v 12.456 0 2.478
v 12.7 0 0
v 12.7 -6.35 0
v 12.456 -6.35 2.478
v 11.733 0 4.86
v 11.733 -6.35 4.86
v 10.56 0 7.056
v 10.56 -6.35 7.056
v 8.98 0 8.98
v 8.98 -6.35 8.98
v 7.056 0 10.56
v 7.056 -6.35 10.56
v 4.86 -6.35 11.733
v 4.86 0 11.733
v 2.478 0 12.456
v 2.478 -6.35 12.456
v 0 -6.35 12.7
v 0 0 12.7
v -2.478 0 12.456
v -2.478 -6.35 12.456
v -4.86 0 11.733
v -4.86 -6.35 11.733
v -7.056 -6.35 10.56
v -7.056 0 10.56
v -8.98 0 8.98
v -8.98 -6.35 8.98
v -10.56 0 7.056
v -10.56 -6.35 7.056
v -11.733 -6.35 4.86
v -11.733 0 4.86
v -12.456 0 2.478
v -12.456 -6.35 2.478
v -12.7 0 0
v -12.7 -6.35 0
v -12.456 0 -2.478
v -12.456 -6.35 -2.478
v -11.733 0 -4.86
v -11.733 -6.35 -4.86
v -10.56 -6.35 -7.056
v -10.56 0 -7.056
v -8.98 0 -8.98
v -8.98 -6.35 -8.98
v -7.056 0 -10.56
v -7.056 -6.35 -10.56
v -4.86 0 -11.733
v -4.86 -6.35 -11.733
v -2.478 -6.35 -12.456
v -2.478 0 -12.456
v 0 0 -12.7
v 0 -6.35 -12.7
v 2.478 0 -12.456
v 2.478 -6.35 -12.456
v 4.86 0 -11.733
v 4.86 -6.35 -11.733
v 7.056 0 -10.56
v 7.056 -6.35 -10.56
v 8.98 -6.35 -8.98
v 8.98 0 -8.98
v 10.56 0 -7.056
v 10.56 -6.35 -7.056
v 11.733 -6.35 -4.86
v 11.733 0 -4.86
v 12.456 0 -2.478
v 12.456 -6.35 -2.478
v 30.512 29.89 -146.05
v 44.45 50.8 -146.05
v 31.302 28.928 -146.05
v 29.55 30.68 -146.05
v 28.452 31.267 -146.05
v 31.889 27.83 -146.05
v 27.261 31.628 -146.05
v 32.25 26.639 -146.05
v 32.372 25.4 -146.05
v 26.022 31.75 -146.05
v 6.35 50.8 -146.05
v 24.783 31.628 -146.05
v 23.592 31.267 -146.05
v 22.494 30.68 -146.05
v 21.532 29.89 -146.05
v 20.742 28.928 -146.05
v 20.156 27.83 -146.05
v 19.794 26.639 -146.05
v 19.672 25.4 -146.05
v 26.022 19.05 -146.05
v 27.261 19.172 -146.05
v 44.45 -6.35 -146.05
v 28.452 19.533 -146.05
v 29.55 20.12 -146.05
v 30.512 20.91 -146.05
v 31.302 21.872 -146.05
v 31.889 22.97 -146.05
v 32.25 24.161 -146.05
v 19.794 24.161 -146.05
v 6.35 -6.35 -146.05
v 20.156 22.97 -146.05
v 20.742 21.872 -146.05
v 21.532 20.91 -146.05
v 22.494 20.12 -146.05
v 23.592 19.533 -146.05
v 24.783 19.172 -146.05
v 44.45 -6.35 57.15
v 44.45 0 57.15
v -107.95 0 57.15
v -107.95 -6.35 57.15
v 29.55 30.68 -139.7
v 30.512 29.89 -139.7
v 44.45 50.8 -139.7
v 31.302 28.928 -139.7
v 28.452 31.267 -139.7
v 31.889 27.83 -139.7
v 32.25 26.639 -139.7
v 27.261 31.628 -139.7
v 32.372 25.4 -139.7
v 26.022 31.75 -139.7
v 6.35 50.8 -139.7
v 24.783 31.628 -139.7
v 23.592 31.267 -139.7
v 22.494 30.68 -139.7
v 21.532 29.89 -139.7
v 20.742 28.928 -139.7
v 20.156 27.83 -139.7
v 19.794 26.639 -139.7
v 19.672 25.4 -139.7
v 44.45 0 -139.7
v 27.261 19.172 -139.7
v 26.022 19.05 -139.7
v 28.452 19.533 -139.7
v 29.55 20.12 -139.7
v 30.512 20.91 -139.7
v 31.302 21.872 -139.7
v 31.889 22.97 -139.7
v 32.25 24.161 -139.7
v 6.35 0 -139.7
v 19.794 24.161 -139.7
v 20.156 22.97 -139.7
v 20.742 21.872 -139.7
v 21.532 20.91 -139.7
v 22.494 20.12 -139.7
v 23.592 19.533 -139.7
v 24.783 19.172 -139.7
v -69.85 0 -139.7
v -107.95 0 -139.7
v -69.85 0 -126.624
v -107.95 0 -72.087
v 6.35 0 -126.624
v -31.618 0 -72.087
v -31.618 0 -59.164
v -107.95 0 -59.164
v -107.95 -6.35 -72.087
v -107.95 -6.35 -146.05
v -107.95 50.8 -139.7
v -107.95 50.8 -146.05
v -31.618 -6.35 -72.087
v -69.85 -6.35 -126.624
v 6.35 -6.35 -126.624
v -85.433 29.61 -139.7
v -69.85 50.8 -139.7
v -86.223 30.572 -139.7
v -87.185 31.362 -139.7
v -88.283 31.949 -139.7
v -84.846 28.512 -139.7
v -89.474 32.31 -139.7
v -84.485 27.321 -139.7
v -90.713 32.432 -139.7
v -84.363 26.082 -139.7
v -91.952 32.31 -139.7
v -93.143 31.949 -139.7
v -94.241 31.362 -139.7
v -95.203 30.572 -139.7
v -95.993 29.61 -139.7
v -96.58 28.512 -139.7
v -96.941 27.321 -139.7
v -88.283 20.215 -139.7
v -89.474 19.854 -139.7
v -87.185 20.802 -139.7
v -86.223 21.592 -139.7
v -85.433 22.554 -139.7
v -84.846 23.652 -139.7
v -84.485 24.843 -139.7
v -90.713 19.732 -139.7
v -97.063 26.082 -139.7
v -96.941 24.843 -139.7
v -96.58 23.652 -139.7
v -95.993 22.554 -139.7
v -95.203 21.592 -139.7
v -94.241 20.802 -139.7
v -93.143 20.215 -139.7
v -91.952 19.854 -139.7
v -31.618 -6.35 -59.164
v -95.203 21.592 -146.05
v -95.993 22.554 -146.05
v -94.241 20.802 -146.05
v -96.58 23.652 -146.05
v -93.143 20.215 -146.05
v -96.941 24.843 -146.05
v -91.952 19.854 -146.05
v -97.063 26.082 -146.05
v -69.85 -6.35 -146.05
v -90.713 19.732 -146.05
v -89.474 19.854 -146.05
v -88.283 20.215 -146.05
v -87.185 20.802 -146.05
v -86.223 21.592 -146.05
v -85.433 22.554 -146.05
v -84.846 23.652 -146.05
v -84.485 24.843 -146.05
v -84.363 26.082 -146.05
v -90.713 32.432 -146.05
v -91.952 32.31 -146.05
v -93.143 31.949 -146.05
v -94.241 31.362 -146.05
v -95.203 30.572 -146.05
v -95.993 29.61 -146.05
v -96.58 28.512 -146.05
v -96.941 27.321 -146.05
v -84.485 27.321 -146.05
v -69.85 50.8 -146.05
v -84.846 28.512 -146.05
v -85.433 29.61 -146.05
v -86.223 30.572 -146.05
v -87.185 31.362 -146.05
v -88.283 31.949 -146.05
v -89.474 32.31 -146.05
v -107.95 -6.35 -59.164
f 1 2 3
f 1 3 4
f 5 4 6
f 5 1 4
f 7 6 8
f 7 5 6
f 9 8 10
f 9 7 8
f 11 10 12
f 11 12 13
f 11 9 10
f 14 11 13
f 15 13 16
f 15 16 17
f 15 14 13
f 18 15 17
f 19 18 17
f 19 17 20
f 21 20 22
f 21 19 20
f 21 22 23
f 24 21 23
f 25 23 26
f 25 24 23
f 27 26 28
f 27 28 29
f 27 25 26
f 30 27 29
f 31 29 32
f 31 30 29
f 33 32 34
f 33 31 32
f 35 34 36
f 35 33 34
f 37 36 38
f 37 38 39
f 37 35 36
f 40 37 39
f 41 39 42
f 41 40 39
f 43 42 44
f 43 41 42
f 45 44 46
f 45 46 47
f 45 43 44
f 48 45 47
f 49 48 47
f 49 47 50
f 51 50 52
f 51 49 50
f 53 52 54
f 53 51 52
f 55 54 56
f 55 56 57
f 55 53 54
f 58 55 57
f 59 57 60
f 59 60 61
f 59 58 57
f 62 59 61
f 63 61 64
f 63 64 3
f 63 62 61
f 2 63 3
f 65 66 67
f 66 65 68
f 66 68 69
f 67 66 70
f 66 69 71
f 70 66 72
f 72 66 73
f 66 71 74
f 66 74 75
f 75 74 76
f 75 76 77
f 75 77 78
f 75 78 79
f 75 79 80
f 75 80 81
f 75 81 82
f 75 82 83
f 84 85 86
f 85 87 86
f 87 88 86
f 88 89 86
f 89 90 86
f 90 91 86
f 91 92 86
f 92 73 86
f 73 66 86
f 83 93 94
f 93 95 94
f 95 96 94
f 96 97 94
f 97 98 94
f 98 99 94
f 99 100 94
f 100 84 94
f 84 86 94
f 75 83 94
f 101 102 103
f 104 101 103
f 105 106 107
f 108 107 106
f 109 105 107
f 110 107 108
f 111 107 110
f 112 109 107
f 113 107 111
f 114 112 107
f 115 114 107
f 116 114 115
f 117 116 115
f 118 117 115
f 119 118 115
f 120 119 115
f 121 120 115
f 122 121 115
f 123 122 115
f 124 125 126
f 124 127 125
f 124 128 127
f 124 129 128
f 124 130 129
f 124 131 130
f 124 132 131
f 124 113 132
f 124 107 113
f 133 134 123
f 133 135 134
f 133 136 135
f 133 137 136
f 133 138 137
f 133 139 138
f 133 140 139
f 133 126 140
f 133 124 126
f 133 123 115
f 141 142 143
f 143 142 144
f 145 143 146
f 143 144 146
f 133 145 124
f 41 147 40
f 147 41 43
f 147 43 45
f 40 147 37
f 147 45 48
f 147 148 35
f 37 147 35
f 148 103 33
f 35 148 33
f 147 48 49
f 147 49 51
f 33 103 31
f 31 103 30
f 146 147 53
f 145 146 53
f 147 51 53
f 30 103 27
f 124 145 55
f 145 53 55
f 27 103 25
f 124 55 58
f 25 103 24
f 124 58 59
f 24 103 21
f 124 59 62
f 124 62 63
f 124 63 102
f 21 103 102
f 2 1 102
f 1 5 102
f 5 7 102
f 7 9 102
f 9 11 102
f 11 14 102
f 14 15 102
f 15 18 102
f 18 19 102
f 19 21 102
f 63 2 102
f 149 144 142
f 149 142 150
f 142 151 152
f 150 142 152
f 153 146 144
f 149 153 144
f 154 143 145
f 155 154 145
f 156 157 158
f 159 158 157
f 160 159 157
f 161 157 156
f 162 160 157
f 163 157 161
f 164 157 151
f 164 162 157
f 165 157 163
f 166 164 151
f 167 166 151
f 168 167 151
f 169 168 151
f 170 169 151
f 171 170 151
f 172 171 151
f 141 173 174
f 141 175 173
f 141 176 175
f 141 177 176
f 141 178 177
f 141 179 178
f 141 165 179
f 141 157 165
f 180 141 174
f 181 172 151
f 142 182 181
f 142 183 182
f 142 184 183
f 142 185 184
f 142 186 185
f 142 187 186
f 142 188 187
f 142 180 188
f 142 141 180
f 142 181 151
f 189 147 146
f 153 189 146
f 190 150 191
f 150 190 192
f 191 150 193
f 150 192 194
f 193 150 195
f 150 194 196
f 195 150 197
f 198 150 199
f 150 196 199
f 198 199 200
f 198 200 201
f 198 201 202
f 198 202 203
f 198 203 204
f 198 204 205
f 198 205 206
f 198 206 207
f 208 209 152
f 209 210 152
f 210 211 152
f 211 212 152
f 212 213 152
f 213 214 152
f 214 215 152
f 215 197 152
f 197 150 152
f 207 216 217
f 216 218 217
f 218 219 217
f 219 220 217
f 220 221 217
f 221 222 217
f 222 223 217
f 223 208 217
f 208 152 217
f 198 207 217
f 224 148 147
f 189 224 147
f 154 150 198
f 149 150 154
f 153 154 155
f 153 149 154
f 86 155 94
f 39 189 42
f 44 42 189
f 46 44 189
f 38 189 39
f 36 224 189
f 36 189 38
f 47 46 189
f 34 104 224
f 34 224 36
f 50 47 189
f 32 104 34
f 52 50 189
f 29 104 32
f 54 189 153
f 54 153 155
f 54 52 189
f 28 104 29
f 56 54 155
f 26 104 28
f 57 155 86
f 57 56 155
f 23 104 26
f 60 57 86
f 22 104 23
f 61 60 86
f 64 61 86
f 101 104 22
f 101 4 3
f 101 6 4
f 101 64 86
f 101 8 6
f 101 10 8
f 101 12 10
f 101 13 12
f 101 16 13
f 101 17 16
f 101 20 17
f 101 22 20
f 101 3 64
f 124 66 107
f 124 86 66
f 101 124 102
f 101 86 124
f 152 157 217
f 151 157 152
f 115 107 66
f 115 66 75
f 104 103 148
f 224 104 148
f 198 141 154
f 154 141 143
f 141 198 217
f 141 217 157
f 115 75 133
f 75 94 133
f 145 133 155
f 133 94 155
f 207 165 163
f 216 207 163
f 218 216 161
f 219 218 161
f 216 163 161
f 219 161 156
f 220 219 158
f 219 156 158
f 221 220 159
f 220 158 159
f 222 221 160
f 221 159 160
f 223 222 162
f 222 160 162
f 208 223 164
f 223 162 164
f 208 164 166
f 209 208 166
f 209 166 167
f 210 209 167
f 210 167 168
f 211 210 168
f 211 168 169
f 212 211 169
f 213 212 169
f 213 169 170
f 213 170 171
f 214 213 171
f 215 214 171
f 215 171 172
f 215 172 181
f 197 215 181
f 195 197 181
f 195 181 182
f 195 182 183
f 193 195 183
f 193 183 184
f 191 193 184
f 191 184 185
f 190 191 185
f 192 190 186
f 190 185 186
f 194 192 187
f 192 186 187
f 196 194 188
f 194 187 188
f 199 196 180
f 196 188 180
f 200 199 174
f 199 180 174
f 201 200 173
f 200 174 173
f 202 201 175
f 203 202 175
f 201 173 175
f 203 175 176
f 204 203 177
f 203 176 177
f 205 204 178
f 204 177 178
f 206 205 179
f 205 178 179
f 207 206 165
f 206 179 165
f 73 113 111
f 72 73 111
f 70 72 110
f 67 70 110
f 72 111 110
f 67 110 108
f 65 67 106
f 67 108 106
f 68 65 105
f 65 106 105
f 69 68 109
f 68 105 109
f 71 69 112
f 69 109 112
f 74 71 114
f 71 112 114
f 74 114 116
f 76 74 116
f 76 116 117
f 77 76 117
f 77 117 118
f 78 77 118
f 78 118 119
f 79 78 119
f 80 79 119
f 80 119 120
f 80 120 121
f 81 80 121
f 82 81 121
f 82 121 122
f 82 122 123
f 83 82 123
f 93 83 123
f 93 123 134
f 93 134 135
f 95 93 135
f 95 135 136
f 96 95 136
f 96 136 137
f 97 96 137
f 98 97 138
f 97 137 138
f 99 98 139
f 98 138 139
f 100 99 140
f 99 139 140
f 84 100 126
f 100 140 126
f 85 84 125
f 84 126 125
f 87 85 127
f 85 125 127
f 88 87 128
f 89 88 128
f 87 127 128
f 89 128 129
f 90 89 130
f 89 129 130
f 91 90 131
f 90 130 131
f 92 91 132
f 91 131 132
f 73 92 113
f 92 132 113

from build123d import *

# Parameters (mm, degrees)
F0_R     = 12.7
F1_DEPTH = 6.35
F2_W     = 38.1
F2_H     = 6.35
F3_DEPTH = 50.8
F4_R     = 6.35
F5_DEPTH = 25.4


with BuildPart() as f1:
    # F0 (on Front) → F1 (new body)
    with BuildSketch(Plane.XZ):
        Polygon((44.45, 57.15), (-107.95, 57.15), (-107.95, -59.163763), (-31.618457, -59.163763), (-31.618457, -72.087309), (-107.95, -72.087309), (-107.95, -146.05), (-69.85, -146.05), (-69.85, -126.62439), (6.35, -126.62439), (6.35, -146.05), (44.45, -146.05), align=None)
        Circle(F0_R, mode=Mode.SUBTRACT)
    extrude(amount=F1_DEPTH)

    # F2 (on face) → F3 (join)
    with BuildSketch(Plane(origin=(0, 0, 0), x_dir=(-1, 0, 0), z_dir=(0, 1, 0))):
        with Locations((-25.4, -142.875)):
            Rectangle(F2_W, F2_H)
        with Locations((88.9, -142.875)):
            Rectangle(F2_W, F2_H)
    extrude(amount=F3_DEPTH)

    # F4 (on face) → F5 (cut)
    with BuildSketch(Plane.XY.offset(-139.7)):
        with Locations((26.022155, 25.4)):
            Circle(F4_R)
        with Locations((-90.712979, 26.081869)):
            Circle(F4_R)
    extrude(amount=-F5_DEPTH, mode=Mode.SUBTRACT)


solid = f1.part
